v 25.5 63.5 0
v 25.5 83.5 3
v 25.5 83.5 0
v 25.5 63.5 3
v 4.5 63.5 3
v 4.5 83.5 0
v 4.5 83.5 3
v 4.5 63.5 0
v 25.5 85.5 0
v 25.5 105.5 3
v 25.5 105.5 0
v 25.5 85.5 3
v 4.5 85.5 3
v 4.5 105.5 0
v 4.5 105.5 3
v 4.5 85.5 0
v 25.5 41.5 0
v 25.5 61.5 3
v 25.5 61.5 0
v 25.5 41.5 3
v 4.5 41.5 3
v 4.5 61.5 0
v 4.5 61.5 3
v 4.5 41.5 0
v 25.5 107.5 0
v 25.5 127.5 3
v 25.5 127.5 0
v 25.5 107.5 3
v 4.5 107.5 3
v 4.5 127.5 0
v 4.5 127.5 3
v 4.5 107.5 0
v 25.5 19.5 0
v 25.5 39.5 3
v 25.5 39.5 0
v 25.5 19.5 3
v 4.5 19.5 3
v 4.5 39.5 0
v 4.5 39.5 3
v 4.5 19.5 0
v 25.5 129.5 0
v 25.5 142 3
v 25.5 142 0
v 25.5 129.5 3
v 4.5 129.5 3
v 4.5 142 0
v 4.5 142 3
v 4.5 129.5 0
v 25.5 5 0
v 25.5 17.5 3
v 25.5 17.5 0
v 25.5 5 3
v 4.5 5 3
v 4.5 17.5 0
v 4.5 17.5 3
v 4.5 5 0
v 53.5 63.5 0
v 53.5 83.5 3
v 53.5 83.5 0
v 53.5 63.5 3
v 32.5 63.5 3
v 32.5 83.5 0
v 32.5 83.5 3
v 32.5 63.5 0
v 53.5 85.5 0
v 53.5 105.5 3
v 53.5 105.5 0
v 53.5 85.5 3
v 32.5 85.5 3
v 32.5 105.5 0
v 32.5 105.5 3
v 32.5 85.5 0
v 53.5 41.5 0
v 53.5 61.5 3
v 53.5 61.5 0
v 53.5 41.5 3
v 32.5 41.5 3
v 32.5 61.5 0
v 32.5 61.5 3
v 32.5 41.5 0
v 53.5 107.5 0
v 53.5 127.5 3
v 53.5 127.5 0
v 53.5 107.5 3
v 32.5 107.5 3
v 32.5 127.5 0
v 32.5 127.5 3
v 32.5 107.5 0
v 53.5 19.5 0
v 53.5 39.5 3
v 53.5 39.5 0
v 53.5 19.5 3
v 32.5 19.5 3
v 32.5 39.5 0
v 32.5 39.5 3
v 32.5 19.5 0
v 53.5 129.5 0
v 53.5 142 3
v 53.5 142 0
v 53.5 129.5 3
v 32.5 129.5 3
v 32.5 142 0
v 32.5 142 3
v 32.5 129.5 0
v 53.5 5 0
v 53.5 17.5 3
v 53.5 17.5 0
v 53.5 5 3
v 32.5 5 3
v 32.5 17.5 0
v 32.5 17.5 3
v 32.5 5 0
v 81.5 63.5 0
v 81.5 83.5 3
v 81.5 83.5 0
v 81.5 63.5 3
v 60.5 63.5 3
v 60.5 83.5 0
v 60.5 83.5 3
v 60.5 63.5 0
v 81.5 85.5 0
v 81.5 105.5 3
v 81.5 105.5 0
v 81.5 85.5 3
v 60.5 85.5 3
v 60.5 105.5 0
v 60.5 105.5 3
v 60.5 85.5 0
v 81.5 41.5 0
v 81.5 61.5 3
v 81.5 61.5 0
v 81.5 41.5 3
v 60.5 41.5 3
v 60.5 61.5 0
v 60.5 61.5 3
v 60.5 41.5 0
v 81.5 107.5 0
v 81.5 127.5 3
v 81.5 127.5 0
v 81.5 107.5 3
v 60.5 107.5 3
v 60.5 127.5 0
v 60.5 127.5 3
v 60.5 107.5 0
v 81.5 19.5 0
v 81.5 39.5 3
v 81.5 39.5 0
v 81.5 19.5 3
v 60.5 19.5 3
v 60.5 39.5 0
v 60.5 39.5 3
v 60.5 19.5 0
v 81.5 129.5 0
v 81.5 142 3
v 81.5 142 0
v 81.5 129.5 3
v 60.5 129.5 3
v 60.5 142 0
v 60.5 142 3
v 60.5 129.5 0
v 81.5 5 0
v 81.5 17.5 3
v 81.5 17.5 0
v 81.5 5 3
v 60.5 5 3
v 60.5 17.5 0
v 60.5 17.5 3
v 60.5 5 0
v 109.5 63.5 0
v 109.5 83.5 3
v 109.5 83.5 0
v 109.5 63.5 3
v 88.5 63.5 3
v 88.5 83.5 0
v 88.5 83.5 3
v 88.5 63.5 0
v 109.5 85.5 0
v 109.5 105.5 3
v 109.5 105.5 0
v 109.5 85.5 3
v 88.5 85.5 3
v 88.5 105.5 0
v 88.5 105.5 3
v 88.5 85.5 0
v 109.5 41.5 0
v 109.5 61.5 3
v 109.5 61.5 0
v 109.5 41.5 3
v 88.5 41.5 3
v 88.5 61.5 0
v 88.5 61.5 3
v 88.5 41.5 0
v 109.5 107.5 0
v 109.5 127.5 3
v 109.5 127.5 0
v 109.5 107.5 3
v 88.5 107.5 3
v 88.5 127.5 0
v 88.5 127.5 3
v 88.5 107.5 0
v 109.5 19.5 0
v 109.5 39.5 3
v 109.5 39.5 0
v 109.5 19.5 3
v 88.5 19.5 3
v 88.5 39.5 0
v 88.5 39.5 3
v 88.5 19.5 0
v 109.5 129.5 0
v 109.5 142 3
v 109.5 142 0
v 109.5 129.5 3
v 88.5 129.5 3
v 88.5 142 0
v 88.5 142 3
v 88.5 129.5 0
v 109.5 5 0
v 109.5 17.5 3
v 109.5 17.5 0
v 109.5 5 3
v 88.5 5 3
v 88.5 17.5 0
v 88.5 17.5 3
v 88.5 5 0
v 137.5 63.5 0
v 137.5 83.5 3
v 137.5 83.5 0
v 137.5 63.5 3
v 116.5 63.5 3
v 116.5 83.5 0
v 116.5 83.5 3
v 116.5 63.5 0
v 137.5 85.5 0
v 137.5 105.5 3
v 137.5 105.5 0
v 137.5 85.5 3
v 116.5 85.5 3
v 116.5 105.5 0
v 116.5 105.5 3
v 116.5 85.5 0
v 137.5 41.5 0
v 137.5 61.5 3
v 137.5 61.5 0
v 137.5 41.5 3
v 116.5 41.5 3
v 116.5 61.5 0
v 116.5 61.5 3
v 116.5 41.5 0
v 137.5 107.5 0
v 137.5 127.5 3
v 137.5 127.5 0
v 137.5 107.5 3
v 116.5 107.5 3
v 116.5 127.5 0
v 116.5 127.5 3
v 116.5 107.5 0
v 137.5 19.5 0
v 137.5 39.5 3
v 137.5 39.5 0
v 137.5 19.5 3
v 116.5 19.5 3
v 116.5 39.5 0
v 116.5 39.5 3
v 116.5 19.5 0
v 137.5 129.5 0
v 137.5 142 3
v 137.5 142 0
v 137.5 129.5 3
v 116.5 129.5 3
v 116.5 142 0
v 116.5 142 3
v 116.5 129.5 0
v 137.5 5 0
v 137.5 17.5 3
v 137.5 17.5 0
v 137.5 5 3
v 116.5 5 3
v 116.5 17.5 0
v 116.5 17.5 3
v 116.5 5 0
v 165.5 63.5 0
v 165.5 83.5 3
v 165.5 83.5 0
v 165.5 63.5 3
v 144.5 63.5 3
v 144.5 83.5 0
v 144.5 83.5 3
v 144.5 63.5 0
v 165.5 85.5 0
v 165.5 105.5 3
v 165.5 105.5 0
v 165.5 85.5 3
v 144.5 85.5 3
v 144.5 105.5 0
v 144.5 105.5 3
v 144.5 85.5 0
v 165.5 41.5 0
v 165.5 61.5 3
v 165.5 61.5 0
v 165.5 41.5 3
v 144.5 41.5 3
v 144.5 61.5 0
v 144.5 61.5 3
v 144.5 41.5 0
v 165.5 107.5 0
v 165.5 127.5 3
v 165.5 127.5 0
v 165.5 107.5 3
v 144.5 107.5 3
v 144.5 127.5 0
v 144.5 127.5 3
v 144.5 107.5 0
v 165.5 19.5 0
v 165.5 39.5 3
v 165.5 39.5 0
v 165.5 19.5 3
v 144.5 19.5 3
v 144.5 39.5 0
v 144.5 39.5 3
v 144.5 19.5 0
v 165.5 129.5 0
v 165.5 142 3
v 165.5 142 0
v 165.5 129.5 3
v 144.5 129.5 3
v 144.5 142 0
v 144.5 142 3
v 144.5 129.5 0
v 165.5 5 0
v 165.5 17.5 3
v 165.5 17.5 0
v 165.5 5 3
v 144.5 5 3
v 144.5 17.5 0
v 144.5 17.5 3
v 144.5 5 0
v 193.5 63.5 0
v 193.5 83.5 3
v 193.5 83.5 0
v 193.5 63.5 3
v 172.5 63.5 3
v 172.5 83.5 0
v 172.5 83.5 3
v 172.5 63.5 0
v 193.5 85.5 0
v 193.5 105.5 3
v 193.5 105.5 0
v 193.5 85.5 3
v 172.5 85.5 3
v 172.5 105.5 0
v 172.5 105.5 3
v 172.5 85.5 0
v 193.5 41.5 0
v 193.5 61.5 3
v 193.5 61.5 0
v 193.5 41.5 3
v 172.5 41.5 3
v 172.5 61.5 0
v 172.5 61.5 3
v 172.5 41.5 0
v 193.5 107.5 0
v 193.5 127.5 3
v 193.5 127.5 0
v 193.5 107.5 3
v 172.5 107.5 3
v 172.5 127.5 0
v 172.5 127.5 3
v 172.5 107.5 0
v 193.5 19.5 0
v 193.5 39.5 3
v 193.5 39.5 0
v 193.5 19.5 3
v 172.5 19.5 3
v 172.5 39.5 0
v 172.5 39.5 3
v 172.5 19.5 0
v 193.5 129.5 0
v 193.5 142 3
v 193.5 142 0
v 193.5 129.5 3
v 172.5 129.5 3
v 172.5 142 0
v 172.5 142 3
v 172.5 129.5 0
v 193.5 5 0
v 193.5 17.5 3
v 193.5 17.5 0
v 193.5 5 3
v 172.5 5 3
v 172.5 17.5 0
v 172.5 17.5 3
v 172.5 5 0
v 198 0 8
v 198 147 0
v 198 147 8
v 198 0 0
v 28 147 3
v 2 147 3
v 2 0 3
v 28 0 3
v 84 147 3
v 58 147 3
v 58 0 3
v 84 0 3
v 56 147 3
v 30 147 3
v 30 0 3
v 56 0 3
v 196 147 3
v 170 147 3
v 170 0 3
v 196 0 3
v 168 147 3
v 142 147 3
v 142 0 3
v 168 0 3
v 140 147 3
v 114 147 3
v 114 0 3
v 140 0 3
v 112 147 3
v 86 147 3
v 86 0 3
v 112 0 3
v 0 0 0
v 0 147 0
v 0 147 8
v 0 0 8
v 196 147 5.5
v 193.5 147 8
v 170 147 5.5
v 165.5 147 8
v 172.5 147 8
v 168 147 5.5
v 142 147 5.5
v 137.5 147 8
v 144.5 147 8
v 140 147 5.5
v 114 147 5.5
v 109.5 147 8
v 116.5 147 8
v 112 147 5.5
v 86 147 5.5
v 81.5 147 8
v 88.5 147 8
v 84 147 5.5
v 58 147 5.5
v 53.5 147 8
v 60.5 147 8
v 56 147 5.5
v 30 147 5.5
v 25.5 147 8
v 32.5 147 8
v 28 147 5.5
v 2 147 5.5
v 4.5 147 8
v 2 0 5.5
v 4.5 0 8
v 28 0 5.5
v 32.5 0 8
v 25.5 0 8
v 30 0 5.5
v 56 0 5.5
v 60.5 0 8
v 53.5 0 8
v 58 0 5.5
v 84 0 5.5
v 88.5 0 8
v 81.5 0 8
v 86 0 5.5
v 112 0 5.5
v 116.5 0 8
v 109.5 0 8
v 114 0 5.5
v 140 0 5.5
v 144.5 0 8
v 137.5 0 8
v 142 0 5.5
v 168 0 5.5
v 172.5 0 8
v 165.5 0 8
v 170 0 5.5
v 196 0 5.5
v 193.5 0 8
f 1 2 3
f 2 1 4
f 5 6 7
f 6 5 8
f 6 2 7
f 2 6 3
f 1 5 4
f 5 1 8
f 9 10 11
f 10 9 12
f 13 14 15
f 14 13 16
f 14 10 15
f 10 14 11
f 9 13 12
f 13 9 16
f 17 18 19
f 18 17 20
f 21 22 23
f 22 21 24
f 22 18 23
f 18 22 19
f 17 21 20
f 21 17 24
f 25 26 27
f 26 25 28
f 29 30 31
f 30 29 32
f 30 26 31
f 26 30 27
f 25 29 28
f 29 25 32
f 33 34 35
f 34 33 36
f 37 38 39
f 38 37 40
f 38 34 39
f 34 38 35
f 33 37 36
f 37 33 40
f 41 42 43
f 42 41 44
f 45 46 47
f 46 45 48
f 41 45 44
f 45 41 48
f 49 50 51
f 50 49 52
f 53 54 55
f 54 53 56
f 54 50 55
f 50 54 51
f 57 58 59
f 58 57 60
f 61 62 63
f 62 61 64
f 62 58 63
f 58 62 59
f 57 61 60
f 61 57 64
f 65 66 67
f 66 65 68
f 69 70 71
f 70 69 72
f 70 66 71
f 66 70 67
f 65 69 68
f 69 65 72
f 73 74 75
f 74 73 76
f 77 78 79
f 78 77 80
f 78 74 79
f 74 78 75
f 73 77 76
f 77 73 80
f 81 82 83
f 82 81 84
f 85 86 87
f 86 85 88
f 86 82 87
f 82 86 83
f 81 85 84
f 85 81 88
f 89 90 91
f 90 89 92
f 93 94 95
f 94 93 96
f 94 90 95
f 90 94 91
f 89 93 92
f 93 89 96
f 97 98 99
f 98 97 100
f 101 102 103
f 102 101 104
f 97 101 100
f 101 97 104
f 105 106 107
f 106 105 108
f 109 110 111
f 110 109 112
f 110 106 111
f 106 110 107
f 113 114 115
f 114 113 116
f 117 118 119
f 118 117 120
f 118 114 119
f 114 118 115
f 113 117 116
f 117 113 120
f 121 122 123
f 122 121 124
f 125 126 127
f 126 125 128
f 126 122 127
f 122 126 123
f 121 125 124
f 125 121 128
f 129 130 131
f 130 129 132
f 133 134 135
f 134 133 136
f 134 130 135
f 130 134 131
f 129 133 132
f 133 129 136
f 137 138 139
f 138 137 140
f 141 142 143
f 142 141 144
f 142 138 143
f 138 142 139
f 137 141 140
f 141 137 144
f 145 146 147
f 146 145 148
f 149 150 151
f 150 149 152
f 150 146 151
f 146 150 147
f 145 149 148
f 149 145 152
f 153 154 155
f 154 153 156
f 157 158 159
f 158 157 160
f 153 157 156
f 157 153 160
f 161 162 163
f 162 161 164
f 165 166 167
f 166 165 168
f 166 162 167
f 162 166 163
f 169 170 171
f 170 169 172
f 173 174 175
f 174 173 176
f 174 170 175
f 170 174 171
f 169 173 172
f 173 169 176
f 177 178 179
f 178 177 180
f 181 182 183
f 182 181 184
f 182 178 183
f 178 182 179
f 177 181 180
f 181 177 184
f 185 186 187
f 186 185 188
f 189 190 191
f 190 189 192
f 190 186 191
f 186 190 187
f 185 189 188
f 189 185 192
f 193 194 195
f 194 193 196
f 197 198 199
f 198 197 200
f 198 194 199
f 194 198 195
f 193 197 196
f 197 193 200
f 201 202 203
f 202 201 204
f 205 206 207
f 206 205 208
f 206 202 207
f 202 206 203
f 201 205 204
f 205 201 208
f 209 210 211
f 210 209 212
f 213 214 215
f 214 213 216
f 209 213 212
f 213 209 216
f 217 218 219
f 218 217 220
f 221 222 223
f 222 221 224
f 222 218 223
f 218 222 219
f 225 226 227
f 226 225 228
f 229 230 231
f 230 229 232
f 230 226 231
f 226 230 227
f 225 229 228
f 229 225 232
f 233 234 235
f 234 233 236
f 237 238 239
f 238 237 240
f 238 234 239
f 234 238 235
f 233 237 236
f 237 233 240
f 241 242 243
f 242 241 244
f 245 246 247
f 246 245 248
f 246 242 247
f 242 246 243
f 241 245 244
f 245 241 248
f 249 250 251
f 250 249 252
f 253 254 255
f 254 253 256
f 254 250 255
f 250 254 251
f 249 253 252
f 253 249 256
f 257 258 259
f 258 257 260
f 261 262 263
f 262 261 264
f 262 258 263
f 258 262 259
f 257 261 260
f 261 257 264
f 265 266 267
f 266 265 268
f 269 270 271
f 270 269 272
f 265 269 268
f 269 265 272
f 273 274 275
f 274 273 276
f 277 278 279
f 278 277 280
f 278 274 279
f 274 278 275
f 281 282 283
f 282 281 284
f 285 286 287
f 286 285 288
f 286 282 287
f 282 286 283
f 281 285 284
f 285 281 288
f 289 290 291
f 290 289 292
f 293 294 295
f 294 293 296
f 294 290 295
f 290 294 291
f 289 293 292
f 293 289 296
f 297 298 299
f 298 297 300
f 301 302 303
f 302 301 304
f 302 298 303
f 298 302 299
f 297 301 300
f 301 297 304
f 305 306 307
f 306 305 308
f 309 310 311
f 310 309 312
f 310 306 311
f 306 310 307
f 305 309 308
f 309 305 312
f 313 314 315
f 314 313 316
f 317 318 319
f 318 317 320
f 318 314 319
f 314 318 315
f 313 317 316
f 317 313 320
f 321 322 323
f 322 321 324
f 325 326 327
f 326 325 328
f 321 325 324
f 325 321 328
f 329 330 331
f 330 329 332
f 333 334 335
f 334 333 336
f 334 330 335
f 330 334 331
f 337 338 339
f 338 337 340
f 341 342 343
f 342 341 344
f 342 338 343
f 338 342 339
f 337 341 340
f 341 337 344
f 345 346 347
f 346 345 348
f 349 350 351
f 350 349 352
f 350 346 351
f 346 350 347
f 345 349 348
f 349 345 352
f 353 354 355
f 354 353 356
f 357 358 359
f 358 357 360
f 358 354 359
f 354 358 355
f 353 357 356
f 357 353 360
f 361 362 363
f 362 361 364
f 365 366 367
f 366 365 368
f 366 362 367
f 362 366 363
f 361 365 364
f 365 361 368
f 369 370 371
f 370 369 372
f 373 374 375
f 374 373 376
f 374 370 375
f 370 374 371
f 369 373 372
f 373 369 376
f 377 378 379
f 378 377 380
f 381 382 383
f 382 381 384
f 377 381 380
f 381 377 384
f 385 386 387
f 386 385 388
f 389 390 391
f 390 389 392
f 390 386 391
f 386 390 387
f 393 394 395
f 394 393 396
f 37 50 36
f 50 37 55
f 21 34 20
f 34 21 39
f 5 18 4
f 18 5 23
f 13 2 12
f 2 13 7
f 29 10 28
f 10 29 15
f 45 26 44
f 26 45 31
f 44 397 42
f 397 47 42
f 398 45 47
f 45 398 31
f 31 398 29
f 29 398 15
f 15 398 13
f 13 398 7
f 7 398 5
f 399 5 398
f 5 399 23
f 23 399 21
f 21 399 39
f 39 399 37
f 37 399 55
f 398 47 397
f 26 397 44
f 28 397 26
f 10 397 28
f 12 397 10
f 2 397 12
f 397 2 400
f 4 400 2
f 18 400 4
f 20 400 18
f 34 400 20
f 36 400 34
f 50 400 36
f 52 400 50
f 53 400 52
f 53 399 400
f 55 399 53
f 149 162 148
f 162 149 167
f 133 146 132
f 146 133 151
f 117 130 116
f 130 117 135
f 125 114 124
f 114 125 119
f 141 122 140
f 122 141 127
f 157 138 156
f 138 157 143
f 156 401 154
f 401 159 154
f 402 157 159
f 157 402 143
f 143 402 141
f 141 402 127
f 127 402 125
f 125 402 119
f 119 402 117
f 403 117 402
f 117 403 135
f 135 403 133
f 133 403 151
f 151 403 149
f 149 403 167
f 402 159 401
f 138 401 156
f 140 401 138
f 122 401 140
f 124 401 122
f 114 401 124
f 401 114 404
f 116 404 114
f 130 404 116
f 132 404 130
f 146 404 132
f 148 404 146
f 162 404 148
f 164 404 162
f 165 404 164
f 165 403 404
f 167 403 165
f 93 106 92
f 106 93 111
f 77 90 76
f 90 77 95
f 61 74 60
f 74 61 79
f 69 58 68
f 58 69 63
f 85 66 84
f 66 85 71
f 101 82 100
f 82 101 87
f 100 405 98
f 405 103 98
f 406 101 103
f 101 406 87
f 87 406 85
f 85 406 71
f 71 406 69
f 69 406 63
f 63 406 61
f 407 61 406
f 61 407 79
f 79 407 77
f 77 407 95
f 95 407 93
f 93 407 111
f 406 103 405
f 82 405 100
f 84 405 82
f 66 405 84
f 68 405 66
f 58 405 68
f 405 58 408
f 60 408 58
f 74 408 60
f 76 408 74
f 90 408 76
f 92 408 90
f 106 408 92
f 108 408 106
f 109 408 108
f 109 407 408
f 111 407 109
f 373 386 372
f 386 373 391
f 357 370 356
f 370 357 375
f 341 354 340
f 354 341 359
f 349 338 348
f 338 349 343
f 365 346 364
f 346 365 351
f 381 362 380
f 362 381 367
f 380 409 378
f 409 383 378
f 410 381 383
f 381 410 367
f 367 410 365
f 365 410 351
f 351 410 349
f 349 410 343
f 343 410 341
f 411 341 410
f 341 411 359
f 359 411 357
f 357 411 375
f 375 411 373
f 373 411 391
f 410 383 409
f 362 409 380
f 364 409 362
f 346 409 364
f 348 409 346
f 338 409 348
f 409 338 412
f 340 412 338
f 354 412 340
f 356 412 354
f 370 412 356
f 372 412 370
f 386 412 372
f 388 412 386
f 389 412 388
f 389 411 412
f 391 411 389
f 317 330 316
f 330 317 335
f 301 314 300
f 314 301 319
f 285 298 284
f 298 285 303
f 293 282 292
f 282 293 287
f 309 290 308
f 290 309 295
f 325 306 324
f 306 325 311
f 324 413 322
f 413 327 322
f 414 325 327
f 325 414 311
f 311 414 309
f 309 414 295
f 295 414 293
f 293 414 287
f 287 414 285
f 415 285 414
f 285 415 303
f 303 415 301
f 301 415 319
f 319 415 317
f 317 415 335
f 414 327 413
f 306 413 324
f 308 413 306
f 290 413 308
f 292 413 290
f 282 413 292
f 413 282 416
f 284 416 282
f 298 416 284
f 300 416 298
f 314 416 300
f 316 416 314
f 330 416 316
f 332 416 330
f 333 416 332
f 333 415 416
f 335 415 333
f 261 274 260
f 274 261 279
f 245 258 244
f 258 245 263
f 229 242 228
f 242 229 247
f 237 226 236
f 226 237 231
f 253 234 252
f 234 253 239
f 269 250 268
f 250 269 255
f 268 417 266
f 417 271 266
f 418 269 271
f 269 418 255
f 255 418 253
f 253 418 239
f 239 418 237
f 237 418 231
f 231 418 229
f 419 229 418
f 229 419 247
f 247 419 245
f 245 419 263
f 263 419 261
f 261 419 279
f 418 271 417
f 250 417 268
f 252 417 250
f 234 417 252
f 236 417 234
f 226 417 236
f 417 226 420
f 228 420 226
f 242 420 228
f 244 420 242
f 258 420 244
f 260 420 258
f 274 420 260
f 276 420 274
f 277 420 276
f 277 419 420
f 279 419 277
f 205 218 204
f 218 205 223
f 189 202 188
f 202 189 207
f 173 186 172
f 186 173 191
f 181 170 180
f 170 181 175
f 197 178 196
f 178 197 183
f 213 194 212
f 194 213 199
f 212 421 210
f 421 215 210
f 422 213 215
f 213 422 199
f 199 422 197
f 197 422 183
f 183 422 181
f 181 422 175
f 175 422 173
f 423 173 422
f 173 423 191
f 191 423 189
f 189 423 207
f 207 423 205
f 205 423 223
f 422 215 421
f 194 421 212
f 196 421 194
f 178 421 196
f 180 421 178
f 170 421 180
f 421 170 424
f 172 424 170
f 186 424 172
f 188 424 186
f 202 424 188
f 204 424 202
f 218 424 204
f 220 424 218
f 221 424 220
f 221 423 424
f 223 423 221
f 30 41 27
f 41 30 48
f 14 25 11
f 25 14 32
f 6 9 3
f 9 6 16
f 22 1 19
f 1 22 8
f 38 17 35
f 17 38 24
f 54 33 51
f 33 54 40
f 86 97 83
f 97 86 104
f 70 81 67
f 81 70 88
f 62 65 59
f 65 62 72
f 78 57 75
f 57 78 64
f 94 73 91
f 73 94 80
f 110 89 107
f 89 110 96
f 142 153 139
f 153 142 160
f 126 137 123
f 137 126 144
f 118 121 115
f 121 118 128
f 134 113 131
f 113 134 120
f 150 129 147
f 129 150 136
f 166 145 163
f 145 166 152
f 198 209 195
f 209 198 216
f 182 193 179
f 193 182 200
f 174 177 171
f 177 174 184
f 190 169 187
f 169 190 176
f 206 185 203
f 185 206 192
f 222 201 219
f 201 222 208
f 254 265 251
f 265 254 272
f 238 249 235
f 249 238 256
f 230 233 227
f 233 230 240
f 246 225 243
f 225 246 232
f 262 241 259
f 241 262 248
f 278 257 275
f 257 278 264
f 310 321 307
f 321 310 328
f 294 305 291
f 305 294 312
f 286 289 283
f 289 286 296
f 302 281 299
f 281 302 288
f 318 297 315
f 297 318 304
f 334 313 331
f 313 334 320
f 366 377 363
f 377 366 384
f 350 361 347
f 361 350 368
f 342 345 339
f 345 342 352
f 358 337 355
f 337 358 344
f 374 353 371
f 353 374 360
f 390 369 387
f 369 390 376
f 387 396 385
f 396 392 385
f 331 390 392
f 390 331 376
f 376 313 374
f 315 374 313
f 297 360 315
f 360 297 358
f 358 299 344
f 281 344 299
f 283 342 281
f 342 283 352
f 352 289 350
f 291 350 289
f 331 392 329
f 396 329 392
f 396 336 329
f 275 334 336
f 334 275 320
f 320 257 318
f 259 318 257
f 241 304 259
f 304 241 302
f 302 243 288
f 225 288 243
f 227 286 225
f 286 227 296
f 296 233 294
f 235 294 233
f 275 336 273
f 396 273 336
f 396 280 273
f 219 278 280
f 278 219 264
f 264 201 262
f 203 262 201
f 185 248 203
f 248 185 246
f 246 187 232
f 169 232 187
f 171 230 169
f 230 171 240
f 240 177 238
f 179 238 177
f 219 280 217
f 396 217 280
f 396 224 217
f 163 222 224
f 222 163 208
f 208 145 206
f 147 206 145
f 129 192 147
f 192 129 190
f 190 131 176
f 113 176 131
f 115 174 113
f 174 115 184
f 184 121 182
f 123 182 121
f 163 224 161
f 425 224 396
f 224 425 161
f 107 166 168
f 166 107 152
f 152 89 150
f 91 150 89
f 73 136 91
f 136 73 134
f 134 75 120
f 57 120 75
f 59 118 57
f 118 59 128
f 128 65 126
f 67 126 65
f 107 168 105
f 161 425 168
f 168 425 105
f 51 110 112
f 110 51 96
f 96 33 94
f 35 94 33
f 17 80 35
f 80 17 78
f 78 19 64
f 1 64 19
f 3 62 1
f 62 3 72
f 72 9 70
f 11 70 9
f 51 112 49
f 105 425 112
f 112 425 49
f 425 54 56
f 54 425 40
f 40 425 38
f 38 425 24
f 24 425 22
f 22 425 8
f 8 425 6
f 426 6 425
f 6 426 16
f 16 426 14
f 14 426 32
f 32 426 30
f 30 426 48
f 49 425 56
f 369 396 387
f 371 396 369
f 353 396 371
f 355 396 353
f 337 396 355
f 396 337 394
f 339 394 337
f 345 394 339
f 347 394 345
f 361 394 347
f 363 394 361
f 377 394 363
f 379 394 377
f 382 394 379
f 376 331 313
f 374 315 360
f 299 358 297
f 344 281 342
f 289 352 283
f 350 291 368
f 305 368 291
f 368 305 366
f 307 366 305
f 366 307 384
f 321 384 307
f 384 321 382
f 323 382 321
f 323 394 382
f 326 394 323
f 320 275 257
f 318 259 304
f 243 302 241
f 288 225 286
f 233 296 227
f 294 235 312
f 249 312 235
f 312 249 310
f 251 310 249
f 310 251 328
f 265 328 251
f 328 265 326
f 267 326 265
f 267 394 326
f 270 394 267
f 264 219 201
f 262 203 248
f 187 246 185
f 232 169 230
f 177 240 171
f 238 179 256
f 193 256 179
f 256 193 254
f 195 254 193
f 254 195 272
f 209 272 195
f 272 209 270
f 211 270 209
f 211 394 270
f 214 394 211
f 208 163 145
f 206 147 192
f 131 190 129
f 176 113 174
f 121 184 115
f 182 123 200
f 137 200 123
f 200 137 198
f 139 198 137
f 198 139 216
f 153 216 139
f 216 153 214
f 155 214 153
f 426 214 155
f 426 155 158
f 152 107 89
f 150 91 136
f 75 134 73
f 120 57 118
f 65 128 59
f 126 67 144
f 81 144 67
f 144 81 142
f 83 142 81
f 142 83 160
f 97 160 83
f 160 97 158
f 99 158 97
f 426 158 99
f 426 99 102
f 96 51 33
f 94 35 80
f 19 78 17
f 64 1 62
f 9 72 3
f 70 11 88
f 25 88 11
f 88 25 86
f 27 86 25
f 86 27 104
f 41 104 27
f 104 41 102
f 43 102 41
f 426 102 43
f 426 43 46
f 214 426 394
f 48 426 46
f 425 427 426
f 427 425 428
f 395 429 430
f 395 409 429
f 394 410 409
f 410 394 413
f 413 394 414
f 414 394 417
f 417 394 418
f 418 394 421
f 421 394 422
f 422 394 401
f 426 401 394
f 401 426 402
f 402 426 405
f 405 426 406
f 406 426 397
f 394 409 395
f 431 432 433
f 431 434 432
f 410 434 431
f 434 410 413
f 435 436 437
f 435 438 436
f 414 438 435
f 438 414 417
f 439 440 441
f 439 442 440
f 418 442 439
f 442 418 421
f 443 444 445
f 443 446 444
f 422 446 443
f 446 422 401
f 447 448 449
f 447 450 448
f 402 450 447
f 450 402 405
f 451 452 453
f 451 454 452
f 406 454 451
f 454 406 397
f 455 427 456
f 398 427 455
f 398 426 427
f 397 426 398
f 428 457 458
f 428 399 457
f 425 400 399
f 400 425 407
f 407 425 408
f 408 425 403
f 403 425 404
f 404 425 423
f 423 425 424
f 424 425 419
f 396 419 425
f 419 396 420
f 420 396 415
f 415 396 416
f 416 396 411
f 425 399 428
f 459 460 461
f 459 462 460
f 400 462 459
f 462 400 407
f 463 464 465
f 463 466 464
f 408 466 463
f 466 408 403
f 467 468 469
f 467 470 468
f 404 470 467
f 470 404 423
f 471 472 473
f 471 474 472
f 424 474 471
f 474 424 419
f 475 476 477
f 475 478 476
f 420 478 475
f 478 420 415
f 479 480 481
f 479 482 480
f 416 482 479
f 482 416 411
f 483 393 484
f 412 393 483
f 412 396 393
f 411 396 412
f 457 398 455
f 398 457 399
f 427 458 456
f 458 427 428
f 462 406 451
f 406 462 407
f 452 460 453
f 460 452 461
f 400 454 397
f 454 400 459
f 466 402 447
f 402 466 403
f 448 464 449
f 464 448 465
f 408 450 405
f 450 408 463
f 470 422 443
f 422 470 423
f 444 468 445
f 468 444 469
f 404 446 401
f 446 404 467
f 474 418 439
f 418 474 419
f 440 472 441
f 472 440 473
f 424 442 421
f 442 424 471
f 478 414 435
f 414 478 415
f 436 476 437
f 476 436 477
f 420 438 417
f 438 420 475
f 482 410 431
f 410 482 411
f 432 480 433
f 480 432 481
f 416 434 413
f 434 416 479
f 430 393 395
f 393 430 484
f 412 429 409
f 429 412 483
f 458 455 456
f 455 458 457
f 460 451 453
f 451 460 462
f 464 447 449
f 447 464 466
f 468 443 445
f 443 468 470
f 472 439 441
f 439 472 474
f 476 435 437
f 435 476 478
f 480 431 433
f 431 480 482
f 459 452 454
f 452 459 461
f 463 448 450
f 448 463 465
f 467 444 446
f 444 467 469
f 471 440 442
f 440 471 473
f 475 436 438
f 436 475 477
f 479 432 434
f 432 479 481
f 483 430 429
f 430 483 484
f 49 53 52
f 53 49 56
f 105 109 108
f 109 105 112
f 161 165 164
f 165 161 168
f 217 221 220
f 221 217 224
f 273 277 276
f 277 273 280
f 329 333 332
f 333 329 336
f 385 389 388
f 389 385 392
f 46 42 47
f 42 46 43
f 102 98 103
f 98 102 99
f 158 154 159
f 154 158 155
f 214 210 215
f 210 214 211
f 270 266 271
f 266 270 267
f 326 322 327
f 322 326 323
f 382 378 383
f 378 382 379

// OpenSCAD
layer = "1"; // ["1":Samla bottom,"2":Samla top, "3":365 1Liter,"4":365 0.75Liter,"5":custom]

tray16 = 0; // [0:10]
tray20 = 0; // [0:8]
tray25 = 7; // [0:7]
tray28 = 0; // [0:6]
tray32 = 0; // [0:6]
tray40 = 0; // [0:3]
tray50 = 0; // [0:3]
tray60 = 0;
tray75 = 0; // [0:2]

makeLastSolid = false; // [false:"Edge not Tray Solid", true: "Edge not Tray Solid"]

clearance = 1.0;
insertBorderWidth = 2;
edgeTrayBorderWidth = 5;
clampHight = 5;

customWidth = 100;
customDepth = 100;

/* [Hidden] */
trayHollowHight = 20;
version = layer == "1" || layer == "2" ? "samla" : (layer == "5" ? "custom" : "365");
depthPreset = layer == "1" ? 147 : (layer == "2" ? 155 : 124);
hight = version == "samla" ? 3 : 5.2;
widthPreset = layer == "3" ? 183 : (layer == "4" ? 124 : 198);
diameter = 40;

depth = layer == "5" ? customDepth : depthPreset;
width = layer == "5" ? customWidth : widthPreset;


borderHight = clampHight;
borderWidth = 2;

customRoundEdges = false;
edgeDegree = 0.0;

totalTrays = tray20 + tray25 + tray28 + tray32 + tray40 + tray50 + tray16 + tray60 + tray75;
neededWidth = 2 + (tray20 * 20 + tray25 * 25 + tray28 * 28 + tray32 * 32 + tray40 * 40 + tray50 * 50 + tray16 * 16 + tray60 * 60 + tray75 * 75) + totalTrays * (borderWidth + clearance);
for (i=[0:0]) echo(i);
assert( width >= neededWidth, "there are too many trays");

module prismL(){
    hull() polyhedron(
        points=[
            [0,0,borderHight/2],
            [borderHight/2,0,0],
            [borderHight/2,0,borderHight/2],
            [0,depth,borderHight/2],
            [borderHight/2,depth,0],
            [borderHight/2,depth,borderHight/2]
            ],
        faces=[[0,1,2],[1,2,5,4],[1,0,3,4],[0,2,5,3],[3,4,5]]
    );
}

module prismR(){
    hull() polyhedron(
        points=[
            [0,0,borderHight/2],
            [0,0,0],
            [borderHight/2,0,borderHight/2],
            [0,depth,borderHight/2],
            [0,depth,0],
            [borderHight/2,depth,borderHight/2]
            ],
        faces=[[0,1,2],[1,2,5,4],[1,0,3,4],[0,2,5,3],[3,4,5]]
    );
}

module border()
{
    cube([borderWidth, depth, borderHight]);
}

module borders(trayDist, trays, xpos)
{
    if (trays > 0)
    {
        // trays
        for (i=[0:trays]) {
            translate([xpos+i*(trayDist+clearance+borderWidth), 0, hight]) border();
        }
        // trangles R
        for (i=[0:trays-1]) {
            translate([xpos+i*(trayDist+clearance+borderWidth)+borderWidth, 0, borderHight/2+hight]) prismR();
        }
        // trangles L
        for (i=[1:trays]) {
            translate([xpos+i*(trayDist+clearance+borderWidth)-borderHight/2, 0, borderHight/2+hight]) prismL();
        } 
    }
}

module pattern(trayDist, trays, xpos, trayNrFirstTray)
{
    // hollow
    if (trays > 0)
    {
        // trays
        border = borderWidth;
        //x = (trayDist-4)/2 * 2 / 3 * sqrt(3);
        z = 10;

        // border = 2;
        // x = trayDist-4;
        // y = depth - 4;
        // z = 10;
        // hollow
        // for (i=[1:trays]) {
        //     if ( trayNrFirstTray+i > 1 && trayNrFirstTray+i < totalTrays ) {
        //         translate([xpos+i*(trayDist+clearance+borderWidth)-x-border, depth/2-y/2, -1]) cube([x,y,z]);
        //     }
        // }
        
        x = trayDist-2*borderWidth;
        //y = trayDist-insertBorderWidth;
        y = trayHollowHight;

        for (i=[1:trays]) {
            if ( trayNrFirstTray+i > 1 && trayNrFirstTray+i < totalTrays || !makeLastSolid ) {
                //translate([xpos + i * (trayDist + clearance + borderWidth) - trayDist/2 - clearance/2, depth/2, -1]) rotate(30) cylinder(x, x, x, $fn=6);

                hexRow = ceil((depth-border)/y);
                for(n=[0:ceil(hexRow/2)])
                {
                    // translate([xpos + i * (trayDist + clearance + borderWidth) - trayDist/2 - clearance/2, depth/2 - n * (2 * x + 2) , -1]) rotate(30) cylinder(x, x, x, $fn=6);
                    // translate([xpos + i * (trayDist + clearance + borderWidth) - trayDist/2 - clearance/2, depth/2 + n * (2 * x + 2) , -1]) rotate(30) cylinder(x, x, x, $fn=6);
                    translate([xpos + i * (trayDist + clearance + borderWidth) - (trayDist + clearance)/2, depth/2 + n * (y + insertBorderWidth), -1]) cube([x,y,3*hight], center=true);
                    translate([xpos + i * (trayDist + clearance + borderWidth) - (trayDist + clearance)/2, depth/2 - n * (y + insertBorderWidth), -1]) cube([x,y,3*hight], center=true);
                }
            }
        }
    }
}

module tray()
{
    union()
    {
        // Pattern
        difference()
        {
            // Base
            cube([width, depth, hight]);

            // Pattern
            union()
            {
                xpos20 = (width - neededWidth) / 2.0;

                pattern(20, tray20, xpos20, 0);
                xpos25 = xpos20 + tray20 * (clearance+borderWidth+20);

                pattern(25, tray25, xpos25, tray20);
                xpos32 = xpos25 + tray25 * (clearance+borderWidth+25);

                pattern(32, tray32, xpos32, tray20+tray25);
                xpos40 = xpos32 + tray32 * (clearance+borderWidth+32);

                pattern(40, tray40, xpos40, tray20+tray25+tray32);
                xpos50 = xpos40 + tray40 * (clearance+borderWidth+40);
                
                pattern(50, tray50, xpos50, tray20+tray25+tray32+tray40);
                
                xpos60 = xpos50 + tray50 * (clearance+borderWidth+50);
                pattern(60, tray60, xpos60, tray20+tray25+tray32+tray40+tray50);
                
                xpos75 = xpos60 + tray60 * (clearance+borderWidth+60);
                
                pattern(75, tray75, xpos75, tray20+tray25+tray32+tray40+tray60);
                
                xpos16 = xpos75 + tray75 * (clearance+borderWidth+75);
                
                pattern(16, tray16, xpos16, tray20+tray25+tray32+tray40+tray50+tray75);
                xpos28 = xpos16 + tray16 * (clearance+borderWidth+16);

                pattern(28, tray28, xpos28, tray20+tray25+tray32+tray40+tray50+tray75+tray16);
            }
        }

        // Borders
        union()
        {
            xpos20 = (width - neededWidth) / 2.0;

            borders(20, tray20, xpos20);
            xpos25 = xpos20 + tray20 * (clearance+borderWidth+20);

            borders(25, tray25, xpos25);
            xpos32 = xpos25 + tray25 * (clearance+borderWidth+25);

            borders(32, tray32, xpos32);
            xpos40 = xpos32 + tray32 * (clearance+borderWidth+32);

            borders(40, tray40, xpos40);
            xpos50 = xpos40 + tray40 * (clearance+borderWidth+40);
            
            borders(50, tray50, xpos50);
            xpos75 = xpos50 + tray50 * (clearance+borderWidth+50);
            
            borders(75, tray75, xpos75);
            xpos16 = xpos75 + tray75 * (clearance+borderWidth+75);
            
            borders(16, tray16, xpos16);
            xpos28 = xpos16 + tray16 * (clearance+borderWidth+16);

            borders(28, tray28, xpos28);
            
            xpos60 = xpos28 + tray28 * (clearance+borderWidth+28);
            borders(60, tray60, xpos60);

            cube([width,edgeTrayBorderWidth,hight]);
            translate([0, depth-edgeTrayBorderWidth, 0]) cube([width,edgeTrayBorderWidth,hight]);
        }
    }
}

module discQuater(diameter, border, hight)
{
    intersection()
    {
        difference()
        {
            cylinder(d=diameter, h=hight, $fn=120);
            cylinder(d=diameter-border*2, h=hight, $fn=120);
        }
        cube([diameter/2, diameter/2, hight]);
    }
}





if (version == "samla" || version == "custom" && customRoundEdges == false)
{
    tray();
}

else if (version == "365" || version == "custom" && customRoundEdges == true)
{
    union()
    {
        intersection()
        {
            tray();
            minkowski()
            {
                cube([width-diameter, depth-diameter, hight]);
                translate([ diameter/2, diameter/2, 0 ]) cylinder(d=diameter, h=hight+borderHight, $fn=120, center=false);
            }
        }
        //back right
        translate([width-diameter/2, depth-diameter/2, 0]) discQuater(diameter, edgeTrayBorderWidth, hight);
        //front left
        translate([diameter/2, diameter/2, 0]) mirror([1, 1, 0]) discQuater(diameter, edgeTrayBorderWidth, hight);
        //front right
        translate([width-diameter/2, diameter/2, 0]) mirror([0, 1, 0])  discQuater(diameter, edgeTrayBorderWidth, hight);
        //back left
        translate([diameter/2, depth-diameter/2, 0]) mirror([1, 0, 0]) discQuater(diameter, edgeTrayBorderWidth, hight);
    }
}
